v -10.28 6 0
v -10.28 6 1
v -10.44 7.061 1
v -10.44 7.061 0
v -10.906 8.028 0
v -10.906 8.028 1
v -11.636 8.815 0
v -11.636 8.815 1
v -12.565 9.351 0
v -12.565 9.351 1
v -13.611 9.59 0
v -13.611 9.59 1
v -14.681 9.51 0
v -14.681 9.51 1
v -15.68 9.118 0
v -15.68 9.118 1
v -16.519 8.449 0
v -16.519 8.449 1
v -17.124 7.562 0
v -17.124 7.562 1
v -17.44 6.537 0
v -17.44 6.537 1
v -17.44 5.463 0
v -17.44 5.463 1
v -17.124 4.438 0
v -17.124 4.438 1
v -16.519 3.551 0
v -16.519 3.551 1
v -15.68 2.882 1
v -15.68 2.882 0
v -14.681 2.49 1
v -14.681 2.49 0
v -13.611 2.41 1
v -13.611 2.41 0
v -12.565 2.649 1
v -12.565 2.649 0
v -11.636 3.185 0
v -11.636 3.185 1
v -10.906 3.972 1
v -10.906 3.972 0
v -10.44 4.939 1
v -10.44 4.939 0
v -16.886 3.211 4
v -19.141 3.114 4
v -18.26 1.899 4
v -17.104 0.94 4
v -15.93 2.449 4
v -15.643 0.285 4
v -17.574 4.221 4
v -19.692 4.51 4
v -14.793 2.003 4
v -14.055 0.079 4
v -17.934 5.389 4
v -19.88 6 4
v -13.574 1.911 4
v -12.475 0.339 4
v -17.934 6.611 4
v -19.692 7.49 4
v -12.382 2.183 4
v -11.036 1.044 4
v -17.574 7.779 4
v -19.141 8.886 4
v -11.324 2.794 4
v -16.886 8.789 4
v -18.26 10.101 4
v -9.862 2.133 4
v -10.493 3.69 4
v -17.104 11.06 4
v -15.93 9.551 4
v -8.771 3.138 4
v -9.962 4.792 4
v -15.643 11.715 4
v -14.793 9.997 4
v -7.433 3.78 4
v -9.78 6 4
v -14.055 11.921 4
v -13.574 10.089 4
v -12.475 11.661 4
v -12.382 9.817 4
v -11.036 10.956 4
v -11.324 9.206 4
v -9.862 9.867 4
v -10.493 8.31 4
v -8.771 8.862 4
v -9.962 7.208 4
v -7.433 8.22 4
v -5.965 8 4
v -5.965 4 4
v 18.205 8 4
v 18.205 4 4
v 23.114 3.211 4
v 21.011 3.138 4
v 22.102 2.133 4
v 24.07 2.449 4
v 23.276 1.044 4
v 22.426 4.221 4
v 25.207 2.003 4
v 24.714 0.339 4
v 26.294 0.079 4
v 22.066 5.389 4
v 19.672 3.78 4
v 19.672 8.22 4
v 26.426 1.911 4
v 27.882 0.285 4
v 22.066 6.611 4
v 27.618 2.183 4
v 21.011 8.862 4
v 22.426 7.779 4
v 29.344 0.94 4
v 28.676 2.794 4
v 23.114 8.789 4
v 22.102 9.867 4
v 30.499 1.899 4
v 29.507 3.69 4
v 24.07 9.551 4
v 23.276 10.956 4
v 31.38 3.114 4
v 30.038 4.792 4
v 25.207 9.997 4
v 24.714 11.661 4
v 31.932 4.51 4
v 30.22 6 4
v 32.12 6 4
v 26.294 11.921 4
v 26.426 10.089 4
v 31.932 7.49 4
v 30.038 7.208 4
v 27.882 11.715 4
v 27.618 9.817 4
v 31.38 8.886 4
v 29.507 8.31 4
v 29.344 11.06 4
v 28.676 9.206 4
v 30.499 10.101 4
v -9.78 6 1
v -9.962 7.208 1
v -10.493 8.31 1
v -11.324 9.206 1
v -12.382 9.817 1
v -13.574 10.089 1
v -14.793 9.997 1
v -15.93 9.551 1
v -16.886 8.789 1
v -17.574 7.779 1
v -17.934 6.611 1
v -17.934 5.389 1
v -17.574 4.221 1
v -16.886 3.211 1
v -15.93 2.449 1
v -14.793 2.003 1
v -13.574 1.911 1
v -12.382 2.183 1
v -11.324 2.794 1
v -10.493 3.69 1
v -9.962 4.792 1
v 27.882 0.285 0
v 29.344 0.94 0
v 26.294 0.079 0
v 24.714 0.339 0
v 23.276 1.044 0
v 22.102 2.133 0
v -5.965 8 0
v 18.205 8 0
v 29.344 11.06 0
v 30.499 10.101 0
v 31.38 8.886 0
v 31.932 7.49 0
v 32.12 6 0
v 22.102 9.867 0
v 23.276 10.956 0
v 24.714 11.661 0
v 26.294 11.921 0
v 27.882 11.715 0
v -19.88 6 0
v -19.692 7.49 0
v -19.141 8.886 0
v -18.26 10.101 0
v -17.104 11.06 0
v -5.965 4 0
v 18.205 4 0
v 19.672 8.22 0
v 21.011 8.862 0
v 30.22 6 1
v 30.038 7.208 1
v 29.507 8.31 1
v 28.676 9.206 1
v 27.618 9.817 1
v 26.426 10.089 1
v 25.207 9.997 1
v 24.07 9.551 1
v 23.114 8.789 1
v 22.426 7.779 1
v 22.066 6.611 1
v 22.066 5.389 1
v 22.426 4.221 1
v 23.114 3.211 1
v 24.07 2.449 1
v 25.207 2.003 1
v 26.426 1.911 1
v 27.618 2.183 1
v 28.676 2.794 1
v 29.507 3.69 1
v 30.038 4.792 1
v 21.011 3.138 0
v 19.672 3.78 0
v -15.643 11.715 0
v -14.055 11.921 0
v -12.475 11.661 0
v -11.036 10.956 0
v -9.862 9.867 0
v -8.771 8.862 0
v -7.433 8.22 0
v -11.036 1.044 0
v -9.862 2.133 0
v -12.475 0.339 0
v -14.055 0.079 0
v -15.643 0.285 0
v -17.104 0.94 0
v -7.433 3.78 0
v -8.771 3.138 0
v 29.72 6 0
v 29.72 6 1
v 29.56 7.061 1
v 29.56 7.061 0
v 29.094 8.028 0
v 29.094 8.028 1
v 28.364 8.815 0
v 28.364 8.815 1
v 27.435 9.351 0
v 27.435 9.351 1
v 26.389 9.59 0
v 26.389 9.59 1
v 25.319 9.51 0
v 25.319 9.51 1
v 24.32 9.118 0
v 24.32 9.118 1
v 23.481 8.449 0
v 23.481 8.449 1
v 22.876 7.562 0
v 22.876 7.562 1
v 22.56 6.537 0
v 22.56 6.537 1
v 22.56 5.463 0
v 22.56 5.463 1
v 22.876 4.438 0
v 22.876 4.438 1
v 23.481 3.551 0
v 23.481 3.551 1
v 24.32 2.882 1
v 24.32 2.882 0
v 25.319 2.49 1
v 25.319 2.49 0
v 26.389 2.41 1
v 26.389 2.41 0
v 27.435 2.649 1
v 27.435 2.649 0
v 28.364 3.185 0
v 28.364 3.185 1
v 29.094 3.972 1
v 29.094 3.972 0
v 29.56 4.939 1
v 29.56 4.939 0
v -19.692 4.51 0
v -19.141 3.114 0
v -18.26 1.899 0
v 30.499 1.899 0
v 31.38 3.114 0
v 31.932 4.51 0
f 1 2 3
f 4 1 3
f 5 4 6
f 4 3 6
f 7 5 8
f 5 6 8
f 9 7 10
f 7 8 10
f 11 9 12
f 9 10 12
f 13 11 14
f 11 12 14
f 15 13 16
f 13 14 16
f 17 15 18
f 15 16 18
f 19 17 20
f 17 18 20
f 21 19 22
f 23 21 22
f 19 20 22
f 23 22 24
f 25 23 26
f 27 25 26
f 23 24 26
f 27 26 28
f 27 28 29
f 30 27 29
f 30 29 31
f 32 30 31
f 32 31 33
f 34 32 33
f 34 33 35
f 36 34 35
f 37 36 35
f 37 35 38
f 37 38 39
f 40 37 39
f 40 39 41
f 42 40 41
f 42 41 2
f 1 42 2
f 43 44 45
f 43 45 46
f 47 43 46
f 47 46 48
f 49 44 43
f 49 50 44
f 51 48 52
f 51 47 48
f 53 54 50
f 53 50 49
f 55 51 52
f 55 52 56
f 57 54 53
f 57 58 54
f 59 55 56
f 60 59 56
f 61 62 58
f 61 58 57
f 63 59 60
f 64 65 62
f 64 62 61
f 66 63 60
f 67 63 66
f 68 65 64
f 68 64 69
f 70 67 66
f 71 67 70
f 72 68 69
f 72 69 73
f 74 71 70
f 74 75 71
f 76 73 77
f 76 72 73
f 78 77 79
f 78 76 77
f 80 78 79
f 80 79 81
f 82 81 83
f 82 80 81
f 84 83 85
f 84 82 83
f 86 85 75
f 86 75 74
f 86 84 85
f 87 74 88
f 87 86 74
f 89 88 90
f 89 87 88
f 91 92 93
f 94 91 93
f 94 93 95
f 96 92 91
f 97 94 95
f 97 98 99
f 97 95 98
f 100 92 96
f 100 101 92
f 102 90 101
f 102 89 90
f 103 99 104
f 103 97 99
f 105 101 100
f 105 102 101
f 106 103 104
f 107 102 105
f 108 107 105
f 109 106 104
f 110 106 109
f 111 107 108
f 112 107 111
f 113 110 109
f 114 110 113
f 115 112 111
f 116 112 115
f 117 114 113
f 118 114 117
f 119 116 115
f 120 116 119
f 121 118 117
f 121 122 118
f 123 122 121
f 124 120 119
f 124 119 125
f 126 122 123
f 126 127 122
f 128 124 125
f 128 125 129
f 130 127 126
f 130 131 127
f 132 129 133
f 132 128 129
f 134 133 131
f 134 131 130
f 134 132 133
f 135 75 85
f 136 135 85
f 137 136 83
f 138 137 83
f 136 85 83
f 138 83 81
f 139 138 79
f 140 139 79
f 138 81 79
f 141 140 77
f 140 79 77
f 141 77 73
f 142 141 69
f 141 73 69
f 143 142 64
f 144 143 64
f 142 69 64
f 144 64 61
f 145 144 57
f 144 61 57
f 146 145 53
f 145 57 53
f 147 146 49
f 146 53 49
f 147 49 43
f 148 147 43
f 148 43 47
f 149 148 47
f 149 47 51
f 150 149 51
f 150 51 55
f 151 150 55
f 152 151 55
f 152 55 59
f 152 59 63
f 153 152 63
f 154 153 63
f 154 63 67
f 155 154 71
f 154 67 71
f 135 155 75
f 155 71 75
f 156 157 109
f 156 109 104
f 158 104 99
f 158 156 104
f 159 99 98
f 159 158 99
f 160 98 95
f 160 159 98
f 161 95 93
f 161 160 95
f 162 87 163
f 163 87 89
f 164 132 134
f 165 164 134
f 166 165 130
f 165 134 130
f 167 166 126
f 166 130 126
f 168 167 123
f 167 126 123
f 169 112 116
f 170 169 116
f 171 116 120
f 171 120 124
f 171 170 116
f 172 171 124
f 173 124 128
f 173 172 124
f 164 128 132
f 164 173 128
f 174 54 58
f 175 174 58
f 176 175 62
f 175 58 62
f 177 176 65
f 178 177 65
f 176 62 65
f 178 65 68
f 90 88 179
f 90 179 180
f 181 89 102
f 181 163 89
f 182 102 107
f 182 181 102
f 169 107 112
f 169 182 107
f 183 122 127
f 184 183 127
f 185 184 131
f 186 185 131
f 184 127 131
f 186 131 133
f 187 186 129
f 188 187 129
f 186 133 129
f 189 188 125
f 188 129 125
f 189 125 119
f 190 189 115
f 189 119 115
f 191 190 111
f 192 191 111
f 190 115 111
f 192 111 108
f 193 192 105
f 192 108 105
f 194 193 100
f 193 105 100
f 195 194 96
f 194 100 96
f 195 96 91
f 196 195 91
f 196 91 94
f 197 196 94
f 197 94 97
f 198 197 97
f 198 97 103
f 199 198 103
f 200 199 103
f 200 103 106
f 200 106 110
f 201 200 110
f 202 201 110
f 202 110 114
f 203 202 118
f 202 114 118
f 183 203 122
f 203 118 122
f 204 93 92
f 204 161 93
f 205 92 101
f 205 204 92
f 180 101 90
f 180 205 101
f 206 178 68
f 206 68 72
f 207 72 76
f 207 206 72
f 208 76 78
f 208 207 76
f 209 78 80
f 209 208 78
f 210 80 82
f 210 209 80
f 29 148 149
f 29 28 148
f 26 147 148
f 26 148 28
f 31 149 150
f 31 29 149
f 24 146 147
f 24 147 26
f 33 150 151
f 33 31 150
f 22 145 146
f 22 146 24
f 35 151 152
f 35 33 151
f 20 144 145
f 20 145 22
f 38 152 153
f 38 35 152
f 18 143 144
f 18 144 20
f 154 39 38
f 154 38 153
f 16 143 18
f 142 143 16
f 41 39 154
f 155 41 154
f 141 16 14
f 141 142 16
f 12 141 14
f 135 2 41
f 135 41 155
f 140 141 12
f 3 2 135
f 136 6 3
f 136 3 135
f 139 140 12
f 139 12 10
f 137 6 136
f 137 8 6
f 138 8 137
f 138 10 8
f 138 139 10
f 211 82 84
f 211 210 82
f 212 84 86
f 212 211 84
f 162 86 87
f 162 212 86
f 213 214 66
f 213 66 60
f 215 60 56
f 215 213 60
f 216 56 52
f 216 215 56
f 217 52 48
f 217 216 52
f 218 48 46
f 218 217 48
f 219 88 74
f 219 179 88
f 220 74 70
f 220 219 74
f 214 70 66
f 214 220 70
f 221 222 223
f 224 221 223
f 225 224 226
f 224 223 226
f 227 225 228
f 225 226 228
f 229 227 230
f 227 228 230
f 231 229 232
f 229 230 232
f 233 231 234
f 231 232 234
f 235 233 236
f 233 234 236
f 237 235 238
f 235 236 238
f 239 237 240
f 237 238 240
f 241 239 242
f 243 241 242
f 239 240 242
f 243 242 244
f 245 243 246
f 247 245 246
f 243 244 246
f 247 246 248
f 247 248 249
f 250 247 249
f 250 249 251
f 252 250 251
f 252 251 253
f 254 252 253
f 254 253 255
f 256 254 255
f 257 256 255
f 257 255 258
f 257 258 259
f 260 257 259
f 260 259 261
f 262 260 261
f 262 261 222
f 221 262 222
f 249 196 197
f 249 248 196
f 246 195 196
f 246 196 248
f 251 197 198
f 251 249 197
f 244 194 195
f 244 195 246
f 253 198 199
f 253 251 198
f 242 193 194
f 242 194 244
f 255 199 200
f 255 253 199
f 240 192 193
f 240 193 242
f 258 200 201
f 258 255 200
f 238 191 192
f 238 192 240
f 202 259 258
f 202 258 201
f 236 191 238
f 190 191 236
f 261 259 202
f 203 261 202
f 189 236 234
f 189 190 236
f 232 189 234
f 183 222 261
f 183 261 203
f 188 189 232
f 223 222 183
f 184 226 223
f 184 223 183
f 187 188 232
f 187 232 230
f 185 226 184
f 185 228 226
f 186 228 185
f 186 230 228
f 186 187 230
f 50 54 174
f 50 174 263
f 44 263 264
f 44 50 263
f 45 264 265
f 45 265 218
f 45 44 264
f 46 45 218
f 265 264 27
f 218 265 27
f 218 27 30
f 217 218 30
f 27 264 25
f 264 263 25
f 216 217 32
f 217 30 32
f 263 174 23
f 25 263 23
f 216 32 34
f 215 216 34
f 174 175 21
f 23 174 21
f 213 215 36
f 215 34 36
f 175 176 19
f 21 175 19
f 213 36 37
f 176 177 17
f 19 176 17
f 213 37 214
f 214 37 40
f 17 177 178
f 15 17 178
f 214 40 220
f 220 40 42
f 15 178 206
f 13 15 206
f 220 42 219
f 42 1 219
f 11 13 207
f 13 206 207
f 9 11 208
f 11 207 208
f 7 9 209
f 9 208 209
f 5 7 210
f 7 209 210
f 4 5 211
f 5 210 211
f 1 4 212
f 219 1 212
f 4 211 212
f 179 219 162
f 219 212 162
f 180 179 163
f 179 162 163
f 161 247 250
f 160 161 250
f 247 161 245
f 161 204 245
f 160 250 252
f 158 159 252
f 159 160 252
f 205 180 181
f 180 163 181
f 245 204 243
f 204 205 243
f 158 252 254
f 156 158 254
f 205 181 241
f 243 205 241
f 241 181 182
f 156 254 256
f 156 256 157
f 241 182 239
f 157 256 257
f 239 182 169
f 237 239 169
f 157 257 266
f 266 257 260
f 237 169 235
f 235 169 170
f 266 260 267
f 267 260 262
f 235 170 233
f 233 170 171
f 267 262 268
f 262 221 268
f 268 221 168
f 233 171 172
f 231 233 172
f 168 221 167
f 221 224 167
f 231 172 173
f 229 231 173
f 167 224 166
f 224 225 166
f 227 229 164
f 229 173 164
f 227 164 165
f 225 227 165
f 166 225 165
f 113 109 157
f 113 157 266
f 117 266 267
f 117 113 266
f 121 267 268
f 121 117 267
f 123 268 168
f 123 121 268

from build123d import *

# Parameters (mm, degrees)
F0_W        = 52
F0_H        = 12
F1_DEPTH    = 4
F2_R        = 4.1
F2_R_2      = 3.6
F3_DEPTH    = 3
F4_DEPTH    = 25
F5_R        = 5.99999
F6_W        = 30
F6_H        = 4
F7_DEPTH    = 25
F8_T1_DEPTH = 45.3877798739
F9_R        = 5


# Not quite as in the source:
# - a fillet or chamfer that OpenCascade refuses, or shapes differently, is made with other operations: its cross-section is extruded or revolved along the edge and cut away or added
# - a fillet or chamfer is up to 0.001 mm smaller than in the source, because OpenCascade refuses the exact size
# - a feature names something its author has since deleted; it is built from what else it names


with BuildPart() as f1:
    # F0 (on Top) → F1 (new body)
    with BuildSketch(Plane.XY):
        with Locations((6.1197612388, 6)):
            Rectangle(F0_W, F0_H)
    extrude(amount=F1_DEPTH)

    # F2 (on face) → F3 (cut)
    with BuildSketch(Plane.XY.offset(4)):
        with Locations((-13.8802387612, 6)):
            Circle(F2_R)
        with Locations((-13.8802387612, 6)):
            Circle(F2_R_2, mode=Mode.SUBTRACT)
        with Locations((26.1197612388, 6)):
            Circle(F2_R)
        with Locations((26.1197612388, 6)):
            Circle(F2_R_2, mode=Mode.SUBTRACT)
    extrude(amount=-F3_DEPTH, mode=Mode.SUBTRACT)

    # F2 (on face) → F4 (cut)
    with BuildSketch(Plane.XY.offset(4)):
        with Locations((-13.8802387612, 6)):
            Circle(F2_R_2)
        with Locations((26.1197612388, 6)):
            Circle(F2_R_2)
    extrude(amount=-F4_DEPTH, mode=Mode.SUBTRACT)

    # F5 (radius 6 in the source; OpenCascade refuses exactly that, so slightly less here)
    f5_edges = [f1.edges().sort_by_distance(p)[0] for p in [
        (32.119761, 12, 2),
        (32.119761, 0, 2),
        (-19.880239, 12, 2),
        (-19.880239, 0, 2),
    ]]
    fillet(f5_edges, radius=F5_R)

    # F6 (on face) → F7 (cut)
    with BuildSketch(Plane.XY.offset(4)):
        with Locations((6.1197612388, 10)):
            Rectangle(F6_W, F6_H)
        with Locations((6.1197612388, 2)):
            Rectangle(F6_W, F6_H)
    extrude(amount=-F7_DEPTH, mode=Mode.SUBTRACT)

    # F8: fillet of radius 5.5 on 4 edges, made by hand

    # F8_s2 → F8_t1 (cut)
    with BuildSketch(Plane.XY.offset(-20.693889937)):
        with BuildLine():
            ThreePointArc((-17.1042715454, 11.0602033843), (-12.2308229409, 11.5763851223), (-8.8802387612, 8))
            Line((-8.8802387612, 8), (-8.3533713972, 8.1578314949))
            ThreePointArc((-8.3533713972, 8.1578314949), (-8.3302387612, 10), (-8.3302387612, 12))
            Line((-8.3302387612, 12), (-8.8802387612, 12.55))
            ThreePointArc((-8.8802387612, 12.55), (-13.8802487612, 12.55), (-17.3998074599, 11.5240552176))
            Line((-17.3998074599, 11.5240552176), (-17.1042715454, 11.0602033843))
        make_face()
        with BuildLine():
            ThreePointArc((-8.8802387612, 4), (-12.2308229409, 0.4236148777), (-17.1042715454, 0.9397966157))
            Line((-17.1042715454, 0.9397966157), (-17.3998074599, 0.4759447824))
            ThreePointArc((-17.3998074599, 0.4759447824), (-13.8802487612, -0.55), (-8.8802387612, -0.55))
            Line((-8.8802387612, -0.55), (-8.3302387612, 0))
            ThreePointArc((-8.3302387612, 0), (-8.3302387612, 2), (-8.3533713972, 3.8421685051))
            Line((-8.3533713972, 3.8421685051), (-8.8802387612, 4))
        make_face()
        with BuildLine():
            ThreePointArc((29.3437940231, 0.9397966157), (24.4703454185, 0.4236148777), (21.1197612388, 4))
            Line((21.1197612388, 4), (20.5928938749, 3.8421685051))
            ThreePointArc((20.5928938749, 3.8421685051), (20.5697612388, 2), (20.5697612388, 0))
            Line((20.5697612388, 0), (21.1197612388, -0.55))
            ThreePointArc((21.1197612388, -0.55), (26.1197712388, -0.55), (29.6393299376, 0.4759447824))
            Line((29.6393299376, 0.4759447824), (29.3437940231, 0.9397966157))
        make_face()
        with BuildLine():
            ThreePointArc((21.1197612388, 8), (24.4703454185, 11.5763851223), (29.3437940231, 11.0602033843))
            Line((29.3437940231, 11.0602033843), (29.6393299376, 11.5240552176))
            ThreePointArc((29.6393299376, 11.5240552176), (26.1197712388, 12.55), (21.1197612388, 12.55))
            Line((21.1197612388, 12.55), (20.5697612388, 12))
            ThreePointArc((20.5697612388, 12), (20.5697612388, 10), (20.5928938749, 8.1578314949))
            Line((20.5928938749, 8.1578314949), (21.1197612388, 8))
        make_face()
    extrude(amount=F8_T1_DEPTH, mode=Mode.SUBTRACT)

    # F9
    f9_edges = [f1.edges().sort_by_distance(p)[0] for p in [
        (-8.880239, 8, 2),
        (-8.880239, 4, 2),
        (21.119761, 8, 2),
        (21.119761, 4, 2),
    ]]
    fillet(f9_edges, radius=F9_R)


solid = f1.part
